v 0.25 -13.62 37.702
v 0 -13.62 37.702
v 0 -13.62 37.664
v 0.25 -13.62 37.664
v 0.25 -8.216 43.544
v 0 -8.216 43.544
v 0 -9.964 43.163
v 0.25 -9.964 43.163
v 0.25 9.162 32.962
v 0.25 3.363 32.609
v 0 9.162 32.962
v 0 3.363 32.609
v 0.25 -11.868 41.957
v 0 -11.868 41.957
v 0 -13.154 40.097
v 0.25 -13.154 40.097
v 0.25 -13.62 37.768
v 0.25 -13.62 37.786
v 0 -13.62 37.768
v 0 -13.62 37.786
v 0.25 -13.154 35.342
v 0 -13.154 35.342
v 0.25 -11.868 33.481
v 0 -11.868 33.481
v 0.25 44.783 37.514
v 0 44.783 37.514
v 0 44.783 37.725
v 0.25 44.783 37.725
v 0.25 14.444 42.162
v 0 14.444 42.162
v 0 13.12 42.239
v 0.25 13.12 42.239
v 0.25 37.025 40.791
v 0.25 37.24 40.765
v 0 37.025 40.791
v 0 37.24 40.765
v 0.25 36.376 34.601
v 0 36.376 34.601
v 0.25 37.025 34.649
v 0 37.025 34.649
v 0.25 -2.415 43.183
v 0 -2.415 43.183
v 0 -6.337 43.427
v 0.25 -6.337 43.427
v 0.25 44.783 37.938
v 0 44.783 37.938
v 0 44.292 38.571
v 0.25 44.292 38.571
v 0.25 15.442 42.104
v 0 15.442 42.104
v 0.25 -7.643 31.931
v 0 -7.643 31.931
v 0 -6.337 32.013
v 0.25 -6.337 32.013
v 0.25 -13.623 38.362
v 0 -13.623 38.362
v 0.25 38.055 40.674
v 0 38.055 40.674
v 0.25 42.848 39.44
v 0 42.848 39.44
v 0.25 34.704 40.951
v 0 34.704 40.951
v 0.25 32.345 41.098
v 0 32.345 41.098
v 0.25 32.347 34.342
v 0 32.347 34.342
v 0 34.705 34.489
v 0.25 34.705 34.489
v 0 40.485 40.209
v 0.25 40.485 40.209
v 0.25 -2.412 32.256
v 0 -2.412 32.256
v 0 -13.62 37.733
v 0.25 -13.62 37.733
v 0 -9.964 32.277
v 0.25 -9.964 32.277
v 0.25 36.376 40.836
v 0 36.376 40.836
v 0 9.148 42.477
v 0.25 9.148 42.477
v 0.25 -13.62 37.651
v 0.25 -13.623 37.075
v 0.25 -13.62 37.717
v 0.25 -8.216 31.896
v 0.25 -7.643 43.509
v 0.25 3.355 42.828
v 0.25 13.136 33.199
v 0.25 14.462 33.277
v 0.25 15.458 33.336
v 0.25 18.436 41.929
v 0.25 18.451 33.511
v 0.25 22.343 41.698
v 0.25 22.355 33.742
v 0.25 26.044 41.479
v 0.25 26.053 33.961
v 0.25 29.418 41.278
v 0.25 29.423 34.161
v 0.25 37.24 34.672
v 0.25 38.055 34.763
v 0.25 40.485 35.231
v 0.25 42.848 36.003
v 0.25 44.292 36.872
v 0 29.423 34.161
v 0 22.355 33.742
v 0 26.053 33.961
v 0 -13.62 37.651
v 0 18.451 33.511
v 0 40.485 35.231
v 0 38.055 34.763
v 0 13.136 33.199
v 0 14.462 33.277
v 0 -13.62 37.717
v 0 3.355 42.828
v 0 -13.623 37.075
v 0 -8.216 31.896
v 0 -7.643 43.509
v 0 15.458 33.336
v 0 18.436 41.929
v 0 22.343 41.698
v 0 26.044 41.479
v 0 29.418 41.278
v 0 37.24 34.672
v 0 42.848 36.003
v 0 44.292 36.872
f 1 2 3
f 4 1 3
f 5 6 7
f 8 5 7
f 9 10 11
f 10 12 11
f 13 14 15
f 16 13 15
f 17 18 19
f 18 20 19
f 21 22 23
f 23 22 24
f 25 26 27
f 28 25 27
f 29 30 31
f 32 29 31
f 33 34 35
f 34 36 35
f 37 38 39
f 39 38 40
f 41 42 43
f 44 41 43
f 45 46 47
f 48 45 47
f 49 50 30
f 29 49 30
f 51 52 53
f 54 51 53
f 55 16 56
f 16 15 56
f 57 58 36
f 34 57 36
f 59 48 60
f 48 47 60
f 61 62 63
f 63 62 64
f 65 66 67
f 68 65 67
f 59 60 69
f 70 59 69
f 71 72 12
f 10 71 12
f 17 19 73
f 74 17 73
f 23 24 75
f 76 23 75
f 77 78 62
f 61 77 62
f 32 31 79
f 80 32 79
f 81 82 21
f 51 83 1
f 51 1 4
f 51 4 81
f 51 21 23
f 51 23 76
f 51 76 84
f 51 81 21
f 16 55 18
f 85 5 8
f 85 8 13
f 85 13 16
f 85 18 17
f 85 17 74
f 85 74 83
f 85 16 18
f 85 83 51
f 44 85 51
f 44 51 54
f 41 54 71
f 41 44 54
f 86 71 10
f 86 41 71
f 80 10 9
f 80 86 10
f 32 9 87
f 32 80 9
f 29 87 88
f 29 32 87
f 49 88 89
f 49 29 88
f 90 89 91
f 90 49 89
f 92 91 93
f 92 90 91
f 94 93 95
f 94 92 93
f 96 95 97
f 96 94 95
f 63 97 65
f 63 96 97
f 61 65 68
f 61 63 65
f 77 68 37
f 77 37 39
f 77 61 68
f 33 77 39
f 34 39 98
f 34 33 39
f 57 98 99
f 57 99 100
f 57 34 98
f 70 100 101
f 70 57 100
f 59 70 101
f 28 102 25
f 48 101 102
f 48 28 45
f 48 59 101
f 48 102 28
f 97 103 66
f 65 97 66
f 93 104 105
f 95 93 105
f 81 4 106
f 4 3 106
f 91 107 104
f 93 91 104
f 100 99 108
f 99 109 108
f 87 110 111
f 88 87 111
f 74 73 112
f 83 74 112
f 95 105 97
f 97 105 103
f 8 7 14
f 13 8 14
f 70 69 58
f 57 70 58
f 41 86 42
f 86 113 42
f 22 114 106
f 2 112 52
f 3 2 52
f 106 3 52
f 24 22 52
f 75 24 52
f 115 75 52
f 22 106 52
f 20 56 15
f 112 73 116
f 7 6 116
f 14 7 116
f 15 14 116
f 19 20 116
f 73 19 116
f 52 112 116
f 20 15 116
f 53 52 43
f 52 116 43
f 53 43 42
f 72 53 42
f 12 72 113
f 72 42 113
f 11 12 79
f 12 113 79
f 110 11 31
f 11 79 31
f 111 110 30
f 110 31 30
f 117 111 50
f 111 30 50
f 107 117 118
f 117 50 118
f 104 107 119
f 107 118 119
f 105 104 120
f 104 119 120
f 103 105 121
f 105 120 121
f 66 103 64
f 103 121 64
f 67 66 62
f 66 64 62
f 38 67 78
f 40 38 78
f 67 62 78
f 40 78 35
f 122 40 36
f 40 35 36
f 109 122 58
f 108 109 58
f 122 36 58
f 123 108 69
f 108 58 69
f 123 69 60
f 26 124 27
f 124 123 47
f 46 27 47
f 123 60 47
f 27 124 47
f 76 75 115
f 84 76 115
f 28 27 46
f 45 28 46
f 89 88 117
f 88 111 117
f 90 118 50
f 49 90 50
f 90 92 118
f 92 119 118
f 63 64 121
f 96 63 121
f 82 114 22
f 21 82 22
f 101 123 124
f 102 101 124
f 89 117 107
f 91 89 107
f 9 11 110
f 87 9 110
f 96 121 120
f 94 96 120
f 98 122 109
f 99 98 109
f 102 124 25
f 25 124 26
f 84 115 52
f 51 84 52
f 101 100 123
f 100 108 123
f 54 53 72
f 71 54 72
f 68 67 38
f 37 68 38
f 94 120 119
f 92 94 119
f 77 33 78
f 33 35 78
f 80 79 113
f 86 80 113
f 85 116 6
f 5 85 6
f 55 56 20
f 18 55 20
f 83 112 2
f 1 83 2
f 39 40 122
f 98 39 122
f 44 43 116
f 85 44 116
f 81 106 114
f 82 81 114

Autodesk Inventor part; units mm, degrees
ref_plane "YZ Plane" through (0, 0, 0) normal (1, 0, 0) x (0, 1, 0)
ref_plane "XZ Plane" through (0, 0, 0) normal (0, 1, 0) x (-1, 0, 0)
ref_plane "XY Plane" through (0, 0, 0) normal (0, 0, 1) x (1, 0, 0)
sketch "Sketch1" plane through (0, 0, 0) normal (1, 0, 0) x (0, 1, 0)
  line L0 (-13.6199, 37.7174) -> (-13.6199, 37.7021)
  line L1 (-13.6199, 37.7021) -> (-13.6199, 37.664)
  line L2 (-13.6199, 37.664) -> (-13.6199, 37.6513)
  line L3 (-13.6199, 37.6513) -> (-13.6226, 37.0747)
  line L4 (-13.6226, 37.0747) -> (-13.1538, 35.3425)
  line L5 (-13.1538, 35.3425) -> (-11.8683, 33.4806)
  line L6 (-11.8683, 33.4806) -> (-9.9635, 32.2767)
  line L7 (-9.9635, 32.2767) -> (-8.2163, 31.8957)
  line L8 (-8.2163, 31.8957) -> (-7.643, 31.9312)
  line L9 (-7.643, 31.9312) -> (-6.3367, 32.0125)
  line L10 (-6.3367, 32.0125) -> (-2.4121, 32.2564)
  line L11 (-2.4121, 32.2564) -> (3.3634, 32.6094)
  line L12 (3.3634, 32.6094) -> (9.1619, 32.9625)
  line L13 (9.1619, 32.9625) -> (13.1363, 33.1987)
  line L14 (13.1363, 33.1987) -> (14.4621, 33.2774)
  line L15 (14.4621, 33.2774) -> (15.4583, 33.3359)
  line L16 (15.4583, 33.3359) -> (18.4512, 33.5111)
  line L17 (18.4512, 33.5111) -> (22.3554, 33.7423)
  line L18 (22.3554, 33.7423) -> (26.0527, 33.9607)
  line L19 (26.0527, 33.9607) -> (29.4232, 34.1614)
  line L20 (29.4232, 34.1614) -> (32.3475, 34.3417)
  line L21 (32.3475, 34.3417) -> (34.7054, 34.489)
  line L22 (34.7054, 34.489) -> (36.3755, 34.6008)
  line L23 (36.3755, 34.6008) -> (37.0247, 34.649)
  line L24 (37.0247, 34.649) -> (37.2396, 34.6719)
  line L25 (37.2396, 34.6719) -> (38.0554, 34.7633)
  line L26 (38.0554, 34.7633) -> (40.4847, 35.2307)
  line L27 (40.4847, 35.2307) -> (42.8482, 36.0029)
  line L28 (42.8482, 36.0029) -> (44.2921, 36.8715)
  line L29 (44.2921, 36.8715) -> (44.7829, 37.5142)
  line L30 (44.7829, 37.5142) -> (44.7829, 37.725)
  line L31 (44.7829, 37.725) -> (44.7829, 37.9383)
  line L32 (44.7829, 37.9383) -> (44.2921, 38.5708)
  line L33 (44.2921, 38.5708) -> (42.8482, 39.4395)
  line L34 (42.8482, 39.4395) -> (40.4847, 40.2091)
  line L35 (40.4847, 40.2091) -> (38.0554, 40.6739)
  line L36 (38.0554, 40.6739) -> (37.2396, 40.7654)
  line L37 (37.2396, 40.7654) -> (37.0247, 40.7908)
  line L38 (37.0247, 40.7908) -> (36.3755, 40.8365)
  line L39 (36.3755, 40.8365) -> (34.7042, 40.9508)
  line L40 (34.7042, 40.9508) -> (32.3448, 41.0981)
  line L41 (32.3448, 41.0981) -> (29.4177, 41.2784)
  line L42 (29.4177, 41.2784) -> (26.0445, 41.4791)
  line L43 (26.0445, 41.4791) -> (22.343, 41.6975)
  line L44 (22.343, 41.6975) -> (18.436, 41.9287)
  line L45 (18.436, 41.9287) -> (15.4418, 42.1039)
  line L46 (15.4418, 42.1039) -> (14.4441, 42.1624)
  line L47 (14.4441, 42.1624) -> (13.1197, 42.2386)
  line L48 (13.1197, 42.2386) -> (9.1482, 42.4773)
  line L49 (9.1482, 42.4773) -> (3.3547, 42.8278)
  line L50 (3.3547, 42.8278) -> (-2.4149, 43.1834)
  line L51 (-2.4149, 43.1834) -> (-6.3367, 43.4273)
  line L52 (-6.3367, 43.4273) -> (-7.643, 43.5086)
  line L53 (-7.643, 43.5086) -> (-8.2163, 43.5441)
  line L54 (-8.2163, 43.5441) -> (-9.9635, 43.1631)
  line L55 (-9.9635, 43.1631) -> (-11.8683, 41.9566)
  line L56 (-11.8683, 41.9566) -> (-13.1538, 40.0973)
  line L57 (-13.1538, 40.0973) -> (-13.6226, 38.3625)
  line L58 (-13.6226, 38.3625) -> (-13.6199, 37.7859)
  line L59 (-13.6199, 37.7859) -> (-13.6199, 37.7682)
  line L60 (-13.6199, 37.7682) -> (-13.6199, 37.7326)
  line L61 (-13.6199, 37.7326) -> (-13.6199, 37.7174)
  line L62 (-14.0082, 28.1898) -> (-14.295, 28.6115)
  line L63 (-14.295, 28.6115) -> (-14.4575, 28.8502)
  line L64 (-14.4575, 28.8502) -> (-14.5541, 28.9925)
  line L65 (-14.5541, 28.9925) -> (-15.0049, 29.5817)
extrude "Extrusion27" add sketch "Sketch1" along normal blind 0.25
sketch "Sketch7" plane through (0, 0, 0) normal (-1, 0, 0) x (0, 0, 1)
  circle A0 centre (37.7743, -8.0049) radius 5.5
  circle A1 centre (37.7743, -8.0049) radius 0.5
  point P0 (0, 0)
  dimension "d91" = 11
  dimension "d92" = 1
extrude "Extrusion30" [suppressed]
properties part number "Sticker6"
